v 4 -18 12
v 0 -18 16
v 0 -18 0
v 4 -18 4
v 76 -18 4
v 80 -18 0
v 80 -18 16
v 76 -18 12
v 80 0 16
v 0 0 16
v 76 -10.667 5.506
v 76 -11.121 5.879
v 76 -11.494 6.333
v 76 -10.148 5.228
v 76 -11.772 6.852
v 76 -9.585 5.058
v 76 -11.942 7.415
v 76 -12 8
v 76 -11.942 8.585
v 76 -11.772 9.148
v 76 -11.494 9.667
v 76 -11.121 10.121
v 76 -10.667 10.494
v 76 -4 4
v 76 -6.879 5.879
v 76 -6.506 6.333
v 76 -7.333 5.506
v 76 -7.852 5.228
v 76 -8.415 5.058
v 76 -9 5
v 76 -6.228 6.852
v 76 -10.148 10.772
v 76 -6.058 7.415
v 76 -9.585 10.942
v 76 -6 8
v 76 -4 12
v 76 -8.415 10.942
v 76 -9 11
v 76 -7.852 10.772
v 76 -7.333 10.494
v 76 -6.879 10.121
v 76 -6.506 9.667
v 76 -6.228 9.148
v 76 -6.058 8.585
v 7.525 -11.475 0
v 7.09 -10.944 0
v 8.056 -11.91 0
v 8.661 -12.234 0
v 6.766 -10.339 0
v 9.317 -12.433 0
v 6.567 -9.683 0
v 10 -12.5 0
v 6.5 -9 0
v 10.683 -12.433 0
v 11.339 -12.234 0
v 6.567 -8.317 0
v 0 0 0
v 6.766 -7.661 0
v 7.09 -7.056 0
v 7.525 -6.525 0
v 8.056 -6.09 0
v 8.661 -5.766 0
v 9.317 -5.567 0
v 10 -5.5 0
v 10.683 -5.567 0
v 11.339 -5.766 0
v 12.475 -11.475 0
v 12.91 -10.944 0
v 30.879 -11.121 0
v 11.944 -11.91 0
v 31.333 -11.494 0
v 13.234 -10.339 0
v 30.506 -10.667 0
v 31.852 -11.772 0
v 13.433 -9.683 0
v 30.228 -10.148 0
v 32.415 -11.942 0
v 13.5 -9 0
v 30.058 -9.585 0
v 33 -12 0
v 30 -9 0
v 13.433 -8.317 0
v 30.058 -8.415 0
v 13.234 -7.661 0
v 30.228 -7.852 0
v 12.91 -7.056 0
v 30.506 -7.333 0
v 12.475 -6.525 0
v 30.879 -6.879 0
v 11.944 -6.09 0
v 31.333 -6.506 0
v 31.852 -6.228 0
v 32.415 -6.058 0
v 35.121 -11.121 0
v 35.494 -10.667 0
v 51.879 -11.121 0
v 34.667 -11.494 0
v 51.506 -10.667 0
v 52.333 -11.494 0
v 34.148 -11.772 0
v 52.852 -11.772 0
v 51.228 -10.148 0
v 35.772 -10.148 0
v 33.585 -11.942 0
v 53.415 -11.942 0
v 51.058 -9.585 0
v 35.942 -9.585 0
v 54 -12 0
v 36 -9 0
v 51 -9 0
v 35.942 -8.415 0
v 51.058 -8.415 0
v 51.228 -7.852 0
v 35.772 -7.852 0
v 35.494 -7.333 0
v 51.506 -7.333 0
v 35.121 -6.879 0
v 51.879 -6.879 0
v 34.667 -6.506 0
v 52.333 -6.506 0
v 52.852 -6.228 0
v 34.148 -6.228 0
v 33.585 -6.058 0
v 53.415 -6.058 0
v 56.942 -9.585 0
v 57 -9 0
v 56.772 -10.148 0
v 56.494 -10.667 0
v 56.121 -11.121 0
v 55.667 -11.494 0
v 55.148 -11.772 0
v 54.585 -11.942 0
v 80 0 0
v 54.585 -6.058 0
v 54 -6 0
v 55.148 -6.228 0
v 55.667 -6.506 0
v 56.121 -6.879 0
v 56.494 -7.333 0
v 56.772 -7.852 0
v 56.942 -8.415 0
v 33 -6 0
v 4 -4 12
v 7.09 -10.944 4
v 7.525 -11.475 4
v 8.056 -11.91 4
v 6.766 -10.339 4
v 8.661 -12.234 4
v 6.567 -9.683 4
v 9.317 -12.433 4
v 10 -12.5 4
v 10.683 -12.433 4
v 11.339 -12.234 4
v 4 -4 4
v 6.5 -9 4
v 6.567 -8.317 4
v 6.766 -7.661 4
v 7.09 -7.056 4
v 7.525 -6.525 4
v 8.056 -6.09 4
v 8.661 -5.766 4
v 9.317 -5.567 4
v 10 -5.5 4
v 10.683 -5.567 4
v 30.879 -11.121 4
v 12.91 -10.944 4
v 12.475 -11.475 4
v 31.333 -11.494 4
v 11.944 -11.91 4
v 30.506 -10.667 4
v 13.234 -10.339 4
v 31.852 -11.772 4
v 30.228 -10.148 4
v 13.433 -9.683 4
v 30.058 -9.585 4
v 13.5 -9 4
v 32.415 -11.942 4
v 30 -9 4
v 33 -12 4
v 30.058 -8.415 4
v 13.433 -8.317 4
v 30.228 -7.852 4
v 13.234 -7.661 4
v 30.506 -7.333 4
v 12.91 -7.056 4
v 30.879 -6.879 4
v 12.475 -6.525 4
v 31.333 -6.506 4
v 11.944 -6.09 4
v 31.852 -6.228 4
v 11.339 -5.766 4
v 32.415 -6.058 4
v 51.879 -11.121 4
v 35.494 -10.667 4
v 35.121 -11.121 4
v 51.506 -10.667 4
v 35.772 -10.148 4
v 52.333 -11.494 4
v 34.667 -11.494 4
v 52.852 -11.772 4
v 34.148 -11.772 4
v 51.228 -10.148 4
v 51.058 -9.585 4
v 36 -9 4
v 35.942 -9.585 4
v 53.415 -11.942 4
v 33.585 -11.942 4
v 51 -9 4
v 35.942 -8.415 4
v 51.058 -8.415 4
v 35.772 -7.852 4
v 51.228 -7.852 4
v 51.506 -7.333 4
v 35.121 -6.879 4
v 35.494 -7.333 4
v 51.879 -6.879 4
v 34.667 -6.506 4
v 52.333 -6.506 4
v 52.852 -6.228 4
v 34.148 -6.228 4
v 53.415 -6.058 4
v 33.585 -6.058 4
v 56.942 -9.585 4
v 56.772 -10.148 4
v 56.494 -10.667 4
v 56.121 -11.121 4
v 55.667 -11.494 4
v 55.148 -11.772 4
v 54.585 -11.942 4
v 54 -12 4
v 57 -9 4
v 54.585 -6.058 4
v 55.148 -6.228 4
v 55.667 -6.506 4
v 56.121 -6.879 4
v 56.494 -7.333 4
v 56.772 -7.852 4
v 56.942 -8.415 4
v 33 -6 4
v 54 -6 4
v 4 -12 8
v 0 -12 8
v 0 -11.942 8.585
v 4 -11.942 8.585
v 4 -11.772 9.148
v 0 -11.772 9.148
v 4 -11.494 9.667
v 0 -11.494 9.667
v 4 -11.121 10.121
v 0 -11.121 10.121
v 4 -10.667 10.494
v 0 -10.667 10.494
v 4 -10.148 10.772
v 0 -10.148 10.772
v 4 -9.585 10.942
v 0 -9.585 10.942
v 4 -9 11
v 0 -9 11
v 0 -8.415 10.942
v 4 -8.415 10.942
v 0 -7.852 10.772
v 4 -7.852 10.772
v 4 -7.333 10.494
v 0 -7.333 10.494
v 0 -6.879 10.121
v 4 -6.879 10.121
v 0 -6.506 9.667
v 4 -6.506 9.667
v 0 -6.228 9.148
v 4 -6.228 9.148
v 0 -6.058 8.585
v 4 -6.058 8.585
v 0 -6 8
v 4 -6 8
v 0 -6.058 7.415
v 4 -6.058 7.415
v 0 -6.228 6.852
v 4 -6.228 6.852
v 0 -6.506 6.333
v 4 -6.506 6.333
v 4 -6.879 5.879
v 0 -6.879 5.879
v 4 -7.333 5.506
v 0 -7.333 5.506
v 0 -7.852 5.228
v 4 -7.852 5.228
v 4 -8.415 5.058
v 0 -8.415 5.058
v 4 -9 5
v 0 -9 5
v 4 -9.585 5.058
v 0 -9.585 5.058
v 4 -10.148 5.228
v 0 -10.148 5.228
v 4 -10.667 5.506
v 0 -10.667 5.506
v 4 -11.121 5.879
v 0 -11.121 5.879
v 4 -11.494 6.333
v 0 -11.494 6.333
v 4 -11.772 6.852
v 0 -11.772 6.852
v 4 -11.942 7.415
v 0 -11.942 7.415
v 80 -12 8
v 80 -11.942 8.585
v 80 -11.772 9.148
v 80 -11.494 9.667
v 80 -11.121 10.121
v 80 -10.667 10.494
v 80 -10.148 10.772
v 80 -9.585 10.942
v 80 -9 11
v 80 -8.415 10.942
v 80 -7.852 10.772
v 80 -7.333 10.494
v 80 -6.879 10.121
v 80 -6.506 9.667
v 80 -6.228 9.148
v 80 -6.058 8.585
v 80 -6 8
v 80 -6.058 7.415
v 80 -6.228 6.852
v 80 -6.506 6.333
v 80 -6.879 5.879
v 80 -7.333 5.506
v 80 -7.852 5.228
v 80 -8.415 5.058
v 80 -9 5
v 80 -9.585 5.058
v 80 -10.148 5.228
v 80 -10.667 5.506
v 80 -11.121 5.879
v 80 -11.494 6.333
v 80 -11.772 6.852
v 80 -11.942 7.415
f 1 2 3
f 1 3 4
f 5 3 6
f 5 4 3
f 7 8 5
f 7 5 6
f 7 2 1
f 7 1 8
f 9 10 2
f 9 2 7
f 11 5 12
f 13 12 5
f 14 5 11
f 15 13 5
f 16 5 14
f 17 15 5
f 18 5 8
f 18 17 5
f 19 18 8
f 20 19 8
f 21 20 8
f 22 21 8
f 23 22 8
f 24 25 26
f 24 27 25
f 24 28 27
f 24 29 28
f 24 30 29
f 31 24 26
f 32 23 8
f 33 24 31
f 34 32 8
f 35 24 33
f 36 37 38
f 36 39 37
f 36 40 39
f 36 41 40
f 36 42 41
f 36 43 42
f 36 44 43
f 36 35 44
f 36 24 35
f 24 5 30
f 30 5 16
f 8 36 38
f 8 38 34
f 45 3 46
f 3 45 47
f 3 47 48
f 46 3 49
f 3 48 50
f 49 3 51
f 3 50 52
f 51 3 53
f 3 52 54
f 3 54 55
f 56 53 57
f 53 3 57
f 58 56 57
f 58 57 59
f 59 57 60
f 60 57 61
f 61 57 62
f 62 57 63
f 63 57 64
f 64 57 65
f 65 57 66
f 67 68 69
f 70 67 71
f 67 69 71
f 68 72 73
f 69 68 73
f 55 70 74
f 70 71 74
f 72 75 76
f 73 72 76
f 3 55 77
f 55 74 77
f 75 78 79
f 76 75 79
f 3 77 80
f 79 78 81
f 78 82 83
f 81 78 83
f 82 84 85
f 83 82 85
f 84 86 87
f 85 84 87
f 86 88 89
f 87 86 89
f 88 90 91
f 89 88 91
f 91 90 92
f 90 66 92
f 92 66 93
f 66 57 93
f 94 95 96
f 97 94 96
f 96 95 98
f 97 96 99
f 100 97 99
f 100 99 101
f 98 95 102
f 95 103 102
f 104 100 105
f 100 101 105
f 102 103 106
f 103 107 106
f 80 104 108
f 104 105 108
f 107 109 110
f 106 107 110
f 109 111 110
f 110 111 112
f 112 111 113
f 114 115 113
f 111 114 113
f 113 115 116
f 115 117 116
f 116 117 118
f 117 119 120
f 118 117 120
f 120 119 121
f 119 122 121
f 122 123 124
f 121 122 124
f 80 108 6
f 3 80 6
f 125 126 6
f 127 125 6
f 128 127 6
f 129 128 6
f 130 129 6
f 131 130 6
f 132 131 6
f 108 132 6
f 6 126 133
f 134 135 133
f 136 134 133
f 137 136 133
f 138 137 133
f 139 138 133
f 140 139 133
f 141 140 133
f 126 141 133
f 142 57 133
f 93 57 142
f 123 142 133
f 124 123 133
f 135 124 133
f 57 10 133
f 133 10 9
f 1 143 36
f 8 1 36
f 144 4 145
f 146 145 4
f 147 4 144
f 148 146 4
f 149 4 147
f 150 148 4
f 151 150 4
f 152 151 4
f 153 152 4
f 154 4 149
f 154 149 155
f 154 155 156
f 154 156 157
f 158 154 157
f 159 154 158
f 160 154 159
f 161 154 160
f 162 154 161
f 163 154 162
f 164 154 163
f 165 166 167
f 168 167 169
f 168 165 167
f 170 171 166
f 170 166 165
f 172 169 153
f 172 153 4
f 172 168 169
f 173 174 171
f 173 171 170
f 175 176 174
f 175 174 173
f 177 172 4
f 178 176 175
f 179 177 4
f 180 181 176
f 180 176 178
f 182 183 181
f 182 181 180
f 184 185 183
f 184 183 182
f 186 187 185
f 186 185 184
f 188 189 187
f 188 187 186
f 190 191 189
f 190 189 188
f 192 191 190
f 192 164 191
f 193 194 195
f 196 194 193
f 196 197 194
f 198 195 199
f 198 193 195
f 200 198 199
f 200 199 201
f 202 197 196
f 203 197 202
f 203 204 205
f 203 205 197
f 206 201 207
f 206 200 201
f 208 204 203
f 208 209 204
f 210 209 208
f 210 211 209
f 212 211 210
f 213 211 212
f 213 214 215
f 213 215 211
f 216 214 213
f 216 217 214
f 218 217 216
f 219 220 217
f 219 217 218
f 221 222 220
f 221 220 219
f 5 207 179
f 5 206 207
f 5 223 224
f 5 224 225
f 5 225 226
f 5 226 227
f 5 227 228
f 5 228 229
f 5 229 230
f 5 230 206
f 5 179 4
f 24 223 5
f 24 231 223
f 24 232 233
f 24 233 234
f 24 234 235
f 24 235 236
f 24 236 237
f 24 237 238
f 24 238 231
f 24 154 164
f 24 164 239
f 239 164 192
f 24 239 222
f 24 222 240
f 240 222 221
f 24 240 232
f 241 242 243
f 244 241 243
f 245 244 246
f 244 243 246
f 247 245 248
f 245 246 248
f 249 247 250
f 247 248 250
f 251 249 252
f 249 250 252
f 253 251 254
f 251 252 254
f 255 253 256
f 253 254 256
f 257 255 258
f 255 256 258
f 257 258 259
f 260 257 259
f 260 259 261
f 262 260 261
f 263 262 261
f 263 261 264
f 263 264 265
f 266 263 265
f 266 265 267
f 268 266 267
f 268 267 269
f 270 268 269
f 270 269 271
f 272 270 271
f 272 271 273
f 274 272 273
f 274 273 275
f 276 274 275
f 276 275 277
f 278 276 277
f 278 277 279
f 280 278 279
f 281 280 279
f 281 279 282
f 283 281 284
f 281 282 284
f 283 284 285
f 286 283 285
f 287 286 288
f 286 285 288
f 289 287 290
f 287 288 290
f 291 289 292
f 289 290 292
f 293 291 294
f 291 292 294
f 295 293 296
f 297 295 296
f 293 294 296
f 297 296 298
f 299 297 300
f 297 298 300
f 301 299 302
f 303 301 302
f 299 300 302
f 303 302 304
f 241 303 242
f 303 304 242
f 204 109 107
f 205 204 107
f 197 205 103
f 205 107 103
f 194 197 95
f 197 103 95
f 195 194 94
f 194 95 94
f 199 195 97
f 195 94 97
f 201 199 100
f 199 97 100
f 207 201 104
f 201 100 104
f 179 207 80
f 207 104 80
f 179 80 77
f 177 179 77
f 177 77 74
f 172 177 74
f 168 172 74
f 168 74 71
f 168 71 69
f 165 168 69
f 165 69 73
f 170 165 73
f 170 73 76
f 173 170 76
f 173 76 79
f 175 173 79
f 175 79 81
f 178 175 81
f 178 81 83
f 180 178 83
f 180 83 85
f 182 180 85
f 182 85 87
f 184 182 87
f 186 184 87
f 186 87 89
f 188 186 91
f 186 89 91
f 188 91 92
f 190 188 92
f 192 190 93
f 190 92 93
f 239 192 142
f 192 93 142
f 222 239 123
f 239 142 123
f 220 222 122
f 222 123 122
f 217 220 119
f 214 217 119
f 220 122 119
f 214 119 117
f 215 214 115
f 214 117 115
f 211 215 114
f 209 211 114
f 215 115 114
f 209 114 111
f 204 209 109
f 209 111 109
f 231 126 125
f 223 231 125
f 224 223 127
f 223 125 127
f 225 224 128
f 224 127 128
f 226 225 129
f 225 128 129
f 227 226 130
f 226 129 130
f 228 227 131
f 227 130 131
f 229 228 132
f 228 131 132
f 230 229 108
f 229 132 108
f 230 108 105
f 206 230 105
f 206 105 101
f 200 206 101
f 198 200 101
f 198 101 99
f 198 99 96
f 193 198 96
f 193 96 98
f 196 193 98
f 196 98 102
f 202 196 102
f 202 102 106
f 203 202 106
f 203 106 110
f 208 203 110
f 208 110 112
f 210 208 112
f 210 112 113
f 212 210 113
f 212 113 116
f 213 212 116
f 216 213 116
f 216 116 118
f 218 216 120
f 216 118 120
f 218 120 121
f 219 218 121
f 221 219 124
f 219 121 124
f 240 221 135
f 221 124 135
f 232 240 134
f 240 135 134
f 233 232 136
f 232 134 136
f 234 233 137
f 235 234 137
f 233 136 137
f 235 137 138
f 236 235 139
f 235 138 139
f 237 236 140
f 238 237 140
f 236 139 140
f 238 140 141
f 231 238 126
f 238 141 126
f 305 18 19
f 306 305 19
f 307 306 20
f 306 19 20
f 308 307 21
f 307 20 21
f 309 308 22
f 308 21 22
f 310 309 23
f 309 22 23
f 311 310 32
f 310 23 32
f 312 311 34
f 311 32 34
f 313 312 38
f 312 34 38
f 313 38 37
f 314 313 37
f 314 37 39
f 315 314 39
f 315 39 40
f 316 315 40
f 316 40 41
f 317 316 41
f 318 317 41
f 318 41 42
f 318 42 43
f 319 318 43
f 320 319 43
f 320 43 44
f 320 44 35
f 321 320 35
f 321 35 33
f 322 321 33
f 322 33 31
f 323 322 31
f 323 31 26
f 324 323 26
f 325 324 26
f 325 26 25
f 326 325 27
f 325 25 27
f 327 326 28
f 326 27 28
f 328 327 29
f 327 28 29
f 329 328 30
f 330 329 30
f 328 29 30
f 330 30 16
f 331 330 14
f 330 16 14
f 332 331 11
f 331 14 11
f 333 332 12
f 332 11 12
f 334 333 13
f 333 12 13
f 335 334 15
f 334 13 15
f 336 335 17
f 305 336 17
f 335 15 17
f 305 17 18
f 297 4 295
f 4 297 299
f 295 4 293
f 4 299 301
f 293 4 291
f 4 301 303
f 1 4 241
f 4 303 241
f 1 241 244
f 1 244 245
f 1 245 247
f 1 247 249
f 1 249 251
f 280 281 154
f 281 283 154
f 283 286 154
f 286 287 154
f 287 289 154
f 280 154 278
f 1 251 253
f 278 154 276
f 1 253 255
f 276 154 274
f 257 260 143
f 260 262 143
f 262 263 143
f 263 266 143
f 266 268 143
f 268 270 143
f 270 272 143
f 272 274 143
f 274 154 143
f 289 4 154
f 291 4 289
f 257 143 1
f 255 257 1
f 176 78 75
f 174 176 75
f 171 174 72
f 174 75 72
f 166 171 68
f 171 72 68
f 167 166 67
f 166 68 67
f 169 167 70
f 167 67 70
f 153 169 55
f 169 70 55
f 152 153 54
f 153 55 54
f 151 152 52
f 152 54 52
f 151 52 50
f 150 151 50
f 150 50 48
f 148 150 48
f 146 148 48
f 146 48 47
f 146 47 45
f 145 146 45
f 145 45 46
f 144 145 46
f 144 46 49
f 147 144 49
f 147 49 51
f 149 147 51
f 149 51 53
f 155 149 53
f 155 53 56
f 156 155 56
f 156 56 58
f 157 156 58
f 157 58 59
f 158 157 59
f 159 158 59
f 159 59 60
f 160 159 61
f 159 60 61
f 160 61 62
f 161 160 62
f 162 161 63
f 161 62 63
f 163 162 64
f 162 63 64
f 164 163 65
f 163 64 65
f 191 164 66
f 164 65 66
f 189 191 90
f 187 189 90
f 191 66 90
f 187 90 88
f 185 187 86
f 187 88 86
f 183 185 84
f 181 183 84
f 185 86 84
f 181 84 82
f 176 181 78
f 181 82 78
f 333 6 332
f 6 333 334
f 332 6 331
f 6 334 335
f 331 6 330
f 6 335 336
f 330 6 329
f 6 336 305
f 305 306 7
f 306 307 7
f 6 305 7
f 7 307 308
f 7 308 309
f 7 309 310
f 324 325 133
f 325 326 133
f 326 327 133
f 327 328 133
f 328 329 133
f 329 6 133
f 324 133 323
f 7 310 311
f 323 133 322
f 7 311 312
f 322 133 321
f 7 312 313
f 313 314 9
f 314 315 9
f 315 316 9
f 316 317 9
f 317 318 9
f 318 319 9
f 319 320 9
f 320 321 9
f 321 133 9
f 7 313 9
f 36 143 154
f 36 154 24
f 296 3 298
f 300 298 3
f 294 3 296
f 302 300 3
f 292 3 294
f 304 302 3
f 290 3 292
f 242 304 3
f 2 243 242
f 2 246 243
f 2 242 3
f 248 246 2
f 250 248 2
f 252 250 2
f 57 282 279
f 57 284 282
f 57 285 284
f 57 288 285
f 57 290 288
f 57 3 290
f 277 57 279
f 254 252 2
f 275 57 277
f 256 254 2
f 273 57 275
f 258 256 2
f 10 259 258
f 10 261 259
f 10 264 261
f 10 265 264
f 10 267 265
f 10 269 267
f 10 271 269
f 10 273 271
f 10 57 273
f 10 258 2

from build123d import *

# Parameters (mm, degrees)
F0_W     = 80
F0_H     = 16
F0_W_2   = 72
F0_H_2   = 8
F1_DEPTH = 18
F2_R     = 3
F3_DEPTH = 80
F4_DEPTH = 4
F5_R     = 3.5
F5_R_2   = 3
F6_DEPTH = 5


with BuildPart() as f1:
    # F0 (on Front) → F1 (new body)
    with BuildSketch(Plane.XZ):
        with Locations((40, 8)):
            Rectangle(F0_W, F0_H)
        with Locations((40, 8)):
            Rectangle(F0_W_2, F0_H_2, mode=Mode.SUBTRACT)
    extrude(amount=F1_DEPTH)

    # F2 (on face) → F3 (cut)
    with BuildSketch(Plane(origin=(0, 0, 0), x_dir=(0, -1, 0), z_dir=(-1, 0, 0))):
        with Locations((9, 8)):
            Circle(F2_R)
    extrude(amount=-F3_DEPTH, mode=Mode.SUBTRACT)

    # F0 (on Front) → F4 (join)
    with BuildSketch(Plane.XZ):
        with Locations((40, 8)):
            Rectangle(F0_W_2, F0_H_2)
    extrude(amount=F4_DEPTH)

    # F5 (on face) → F6 (cut)
    with BuildSketch(Plane(origin=(0, 0, 0), x_dir=(1, 0, 0), z_dir=(0, 0, -1))):
        with Locations((10, 9)):
            Circle(F5_R)
        with Locations((33, 9)):
            Circle(F5_R_2)
        with Locations((54, 9)):
            Circle(F5_R_2)
    extrude(amount=-F6_DEPTH, mode=Mode.SUBTRACT)


solid = f1.part
